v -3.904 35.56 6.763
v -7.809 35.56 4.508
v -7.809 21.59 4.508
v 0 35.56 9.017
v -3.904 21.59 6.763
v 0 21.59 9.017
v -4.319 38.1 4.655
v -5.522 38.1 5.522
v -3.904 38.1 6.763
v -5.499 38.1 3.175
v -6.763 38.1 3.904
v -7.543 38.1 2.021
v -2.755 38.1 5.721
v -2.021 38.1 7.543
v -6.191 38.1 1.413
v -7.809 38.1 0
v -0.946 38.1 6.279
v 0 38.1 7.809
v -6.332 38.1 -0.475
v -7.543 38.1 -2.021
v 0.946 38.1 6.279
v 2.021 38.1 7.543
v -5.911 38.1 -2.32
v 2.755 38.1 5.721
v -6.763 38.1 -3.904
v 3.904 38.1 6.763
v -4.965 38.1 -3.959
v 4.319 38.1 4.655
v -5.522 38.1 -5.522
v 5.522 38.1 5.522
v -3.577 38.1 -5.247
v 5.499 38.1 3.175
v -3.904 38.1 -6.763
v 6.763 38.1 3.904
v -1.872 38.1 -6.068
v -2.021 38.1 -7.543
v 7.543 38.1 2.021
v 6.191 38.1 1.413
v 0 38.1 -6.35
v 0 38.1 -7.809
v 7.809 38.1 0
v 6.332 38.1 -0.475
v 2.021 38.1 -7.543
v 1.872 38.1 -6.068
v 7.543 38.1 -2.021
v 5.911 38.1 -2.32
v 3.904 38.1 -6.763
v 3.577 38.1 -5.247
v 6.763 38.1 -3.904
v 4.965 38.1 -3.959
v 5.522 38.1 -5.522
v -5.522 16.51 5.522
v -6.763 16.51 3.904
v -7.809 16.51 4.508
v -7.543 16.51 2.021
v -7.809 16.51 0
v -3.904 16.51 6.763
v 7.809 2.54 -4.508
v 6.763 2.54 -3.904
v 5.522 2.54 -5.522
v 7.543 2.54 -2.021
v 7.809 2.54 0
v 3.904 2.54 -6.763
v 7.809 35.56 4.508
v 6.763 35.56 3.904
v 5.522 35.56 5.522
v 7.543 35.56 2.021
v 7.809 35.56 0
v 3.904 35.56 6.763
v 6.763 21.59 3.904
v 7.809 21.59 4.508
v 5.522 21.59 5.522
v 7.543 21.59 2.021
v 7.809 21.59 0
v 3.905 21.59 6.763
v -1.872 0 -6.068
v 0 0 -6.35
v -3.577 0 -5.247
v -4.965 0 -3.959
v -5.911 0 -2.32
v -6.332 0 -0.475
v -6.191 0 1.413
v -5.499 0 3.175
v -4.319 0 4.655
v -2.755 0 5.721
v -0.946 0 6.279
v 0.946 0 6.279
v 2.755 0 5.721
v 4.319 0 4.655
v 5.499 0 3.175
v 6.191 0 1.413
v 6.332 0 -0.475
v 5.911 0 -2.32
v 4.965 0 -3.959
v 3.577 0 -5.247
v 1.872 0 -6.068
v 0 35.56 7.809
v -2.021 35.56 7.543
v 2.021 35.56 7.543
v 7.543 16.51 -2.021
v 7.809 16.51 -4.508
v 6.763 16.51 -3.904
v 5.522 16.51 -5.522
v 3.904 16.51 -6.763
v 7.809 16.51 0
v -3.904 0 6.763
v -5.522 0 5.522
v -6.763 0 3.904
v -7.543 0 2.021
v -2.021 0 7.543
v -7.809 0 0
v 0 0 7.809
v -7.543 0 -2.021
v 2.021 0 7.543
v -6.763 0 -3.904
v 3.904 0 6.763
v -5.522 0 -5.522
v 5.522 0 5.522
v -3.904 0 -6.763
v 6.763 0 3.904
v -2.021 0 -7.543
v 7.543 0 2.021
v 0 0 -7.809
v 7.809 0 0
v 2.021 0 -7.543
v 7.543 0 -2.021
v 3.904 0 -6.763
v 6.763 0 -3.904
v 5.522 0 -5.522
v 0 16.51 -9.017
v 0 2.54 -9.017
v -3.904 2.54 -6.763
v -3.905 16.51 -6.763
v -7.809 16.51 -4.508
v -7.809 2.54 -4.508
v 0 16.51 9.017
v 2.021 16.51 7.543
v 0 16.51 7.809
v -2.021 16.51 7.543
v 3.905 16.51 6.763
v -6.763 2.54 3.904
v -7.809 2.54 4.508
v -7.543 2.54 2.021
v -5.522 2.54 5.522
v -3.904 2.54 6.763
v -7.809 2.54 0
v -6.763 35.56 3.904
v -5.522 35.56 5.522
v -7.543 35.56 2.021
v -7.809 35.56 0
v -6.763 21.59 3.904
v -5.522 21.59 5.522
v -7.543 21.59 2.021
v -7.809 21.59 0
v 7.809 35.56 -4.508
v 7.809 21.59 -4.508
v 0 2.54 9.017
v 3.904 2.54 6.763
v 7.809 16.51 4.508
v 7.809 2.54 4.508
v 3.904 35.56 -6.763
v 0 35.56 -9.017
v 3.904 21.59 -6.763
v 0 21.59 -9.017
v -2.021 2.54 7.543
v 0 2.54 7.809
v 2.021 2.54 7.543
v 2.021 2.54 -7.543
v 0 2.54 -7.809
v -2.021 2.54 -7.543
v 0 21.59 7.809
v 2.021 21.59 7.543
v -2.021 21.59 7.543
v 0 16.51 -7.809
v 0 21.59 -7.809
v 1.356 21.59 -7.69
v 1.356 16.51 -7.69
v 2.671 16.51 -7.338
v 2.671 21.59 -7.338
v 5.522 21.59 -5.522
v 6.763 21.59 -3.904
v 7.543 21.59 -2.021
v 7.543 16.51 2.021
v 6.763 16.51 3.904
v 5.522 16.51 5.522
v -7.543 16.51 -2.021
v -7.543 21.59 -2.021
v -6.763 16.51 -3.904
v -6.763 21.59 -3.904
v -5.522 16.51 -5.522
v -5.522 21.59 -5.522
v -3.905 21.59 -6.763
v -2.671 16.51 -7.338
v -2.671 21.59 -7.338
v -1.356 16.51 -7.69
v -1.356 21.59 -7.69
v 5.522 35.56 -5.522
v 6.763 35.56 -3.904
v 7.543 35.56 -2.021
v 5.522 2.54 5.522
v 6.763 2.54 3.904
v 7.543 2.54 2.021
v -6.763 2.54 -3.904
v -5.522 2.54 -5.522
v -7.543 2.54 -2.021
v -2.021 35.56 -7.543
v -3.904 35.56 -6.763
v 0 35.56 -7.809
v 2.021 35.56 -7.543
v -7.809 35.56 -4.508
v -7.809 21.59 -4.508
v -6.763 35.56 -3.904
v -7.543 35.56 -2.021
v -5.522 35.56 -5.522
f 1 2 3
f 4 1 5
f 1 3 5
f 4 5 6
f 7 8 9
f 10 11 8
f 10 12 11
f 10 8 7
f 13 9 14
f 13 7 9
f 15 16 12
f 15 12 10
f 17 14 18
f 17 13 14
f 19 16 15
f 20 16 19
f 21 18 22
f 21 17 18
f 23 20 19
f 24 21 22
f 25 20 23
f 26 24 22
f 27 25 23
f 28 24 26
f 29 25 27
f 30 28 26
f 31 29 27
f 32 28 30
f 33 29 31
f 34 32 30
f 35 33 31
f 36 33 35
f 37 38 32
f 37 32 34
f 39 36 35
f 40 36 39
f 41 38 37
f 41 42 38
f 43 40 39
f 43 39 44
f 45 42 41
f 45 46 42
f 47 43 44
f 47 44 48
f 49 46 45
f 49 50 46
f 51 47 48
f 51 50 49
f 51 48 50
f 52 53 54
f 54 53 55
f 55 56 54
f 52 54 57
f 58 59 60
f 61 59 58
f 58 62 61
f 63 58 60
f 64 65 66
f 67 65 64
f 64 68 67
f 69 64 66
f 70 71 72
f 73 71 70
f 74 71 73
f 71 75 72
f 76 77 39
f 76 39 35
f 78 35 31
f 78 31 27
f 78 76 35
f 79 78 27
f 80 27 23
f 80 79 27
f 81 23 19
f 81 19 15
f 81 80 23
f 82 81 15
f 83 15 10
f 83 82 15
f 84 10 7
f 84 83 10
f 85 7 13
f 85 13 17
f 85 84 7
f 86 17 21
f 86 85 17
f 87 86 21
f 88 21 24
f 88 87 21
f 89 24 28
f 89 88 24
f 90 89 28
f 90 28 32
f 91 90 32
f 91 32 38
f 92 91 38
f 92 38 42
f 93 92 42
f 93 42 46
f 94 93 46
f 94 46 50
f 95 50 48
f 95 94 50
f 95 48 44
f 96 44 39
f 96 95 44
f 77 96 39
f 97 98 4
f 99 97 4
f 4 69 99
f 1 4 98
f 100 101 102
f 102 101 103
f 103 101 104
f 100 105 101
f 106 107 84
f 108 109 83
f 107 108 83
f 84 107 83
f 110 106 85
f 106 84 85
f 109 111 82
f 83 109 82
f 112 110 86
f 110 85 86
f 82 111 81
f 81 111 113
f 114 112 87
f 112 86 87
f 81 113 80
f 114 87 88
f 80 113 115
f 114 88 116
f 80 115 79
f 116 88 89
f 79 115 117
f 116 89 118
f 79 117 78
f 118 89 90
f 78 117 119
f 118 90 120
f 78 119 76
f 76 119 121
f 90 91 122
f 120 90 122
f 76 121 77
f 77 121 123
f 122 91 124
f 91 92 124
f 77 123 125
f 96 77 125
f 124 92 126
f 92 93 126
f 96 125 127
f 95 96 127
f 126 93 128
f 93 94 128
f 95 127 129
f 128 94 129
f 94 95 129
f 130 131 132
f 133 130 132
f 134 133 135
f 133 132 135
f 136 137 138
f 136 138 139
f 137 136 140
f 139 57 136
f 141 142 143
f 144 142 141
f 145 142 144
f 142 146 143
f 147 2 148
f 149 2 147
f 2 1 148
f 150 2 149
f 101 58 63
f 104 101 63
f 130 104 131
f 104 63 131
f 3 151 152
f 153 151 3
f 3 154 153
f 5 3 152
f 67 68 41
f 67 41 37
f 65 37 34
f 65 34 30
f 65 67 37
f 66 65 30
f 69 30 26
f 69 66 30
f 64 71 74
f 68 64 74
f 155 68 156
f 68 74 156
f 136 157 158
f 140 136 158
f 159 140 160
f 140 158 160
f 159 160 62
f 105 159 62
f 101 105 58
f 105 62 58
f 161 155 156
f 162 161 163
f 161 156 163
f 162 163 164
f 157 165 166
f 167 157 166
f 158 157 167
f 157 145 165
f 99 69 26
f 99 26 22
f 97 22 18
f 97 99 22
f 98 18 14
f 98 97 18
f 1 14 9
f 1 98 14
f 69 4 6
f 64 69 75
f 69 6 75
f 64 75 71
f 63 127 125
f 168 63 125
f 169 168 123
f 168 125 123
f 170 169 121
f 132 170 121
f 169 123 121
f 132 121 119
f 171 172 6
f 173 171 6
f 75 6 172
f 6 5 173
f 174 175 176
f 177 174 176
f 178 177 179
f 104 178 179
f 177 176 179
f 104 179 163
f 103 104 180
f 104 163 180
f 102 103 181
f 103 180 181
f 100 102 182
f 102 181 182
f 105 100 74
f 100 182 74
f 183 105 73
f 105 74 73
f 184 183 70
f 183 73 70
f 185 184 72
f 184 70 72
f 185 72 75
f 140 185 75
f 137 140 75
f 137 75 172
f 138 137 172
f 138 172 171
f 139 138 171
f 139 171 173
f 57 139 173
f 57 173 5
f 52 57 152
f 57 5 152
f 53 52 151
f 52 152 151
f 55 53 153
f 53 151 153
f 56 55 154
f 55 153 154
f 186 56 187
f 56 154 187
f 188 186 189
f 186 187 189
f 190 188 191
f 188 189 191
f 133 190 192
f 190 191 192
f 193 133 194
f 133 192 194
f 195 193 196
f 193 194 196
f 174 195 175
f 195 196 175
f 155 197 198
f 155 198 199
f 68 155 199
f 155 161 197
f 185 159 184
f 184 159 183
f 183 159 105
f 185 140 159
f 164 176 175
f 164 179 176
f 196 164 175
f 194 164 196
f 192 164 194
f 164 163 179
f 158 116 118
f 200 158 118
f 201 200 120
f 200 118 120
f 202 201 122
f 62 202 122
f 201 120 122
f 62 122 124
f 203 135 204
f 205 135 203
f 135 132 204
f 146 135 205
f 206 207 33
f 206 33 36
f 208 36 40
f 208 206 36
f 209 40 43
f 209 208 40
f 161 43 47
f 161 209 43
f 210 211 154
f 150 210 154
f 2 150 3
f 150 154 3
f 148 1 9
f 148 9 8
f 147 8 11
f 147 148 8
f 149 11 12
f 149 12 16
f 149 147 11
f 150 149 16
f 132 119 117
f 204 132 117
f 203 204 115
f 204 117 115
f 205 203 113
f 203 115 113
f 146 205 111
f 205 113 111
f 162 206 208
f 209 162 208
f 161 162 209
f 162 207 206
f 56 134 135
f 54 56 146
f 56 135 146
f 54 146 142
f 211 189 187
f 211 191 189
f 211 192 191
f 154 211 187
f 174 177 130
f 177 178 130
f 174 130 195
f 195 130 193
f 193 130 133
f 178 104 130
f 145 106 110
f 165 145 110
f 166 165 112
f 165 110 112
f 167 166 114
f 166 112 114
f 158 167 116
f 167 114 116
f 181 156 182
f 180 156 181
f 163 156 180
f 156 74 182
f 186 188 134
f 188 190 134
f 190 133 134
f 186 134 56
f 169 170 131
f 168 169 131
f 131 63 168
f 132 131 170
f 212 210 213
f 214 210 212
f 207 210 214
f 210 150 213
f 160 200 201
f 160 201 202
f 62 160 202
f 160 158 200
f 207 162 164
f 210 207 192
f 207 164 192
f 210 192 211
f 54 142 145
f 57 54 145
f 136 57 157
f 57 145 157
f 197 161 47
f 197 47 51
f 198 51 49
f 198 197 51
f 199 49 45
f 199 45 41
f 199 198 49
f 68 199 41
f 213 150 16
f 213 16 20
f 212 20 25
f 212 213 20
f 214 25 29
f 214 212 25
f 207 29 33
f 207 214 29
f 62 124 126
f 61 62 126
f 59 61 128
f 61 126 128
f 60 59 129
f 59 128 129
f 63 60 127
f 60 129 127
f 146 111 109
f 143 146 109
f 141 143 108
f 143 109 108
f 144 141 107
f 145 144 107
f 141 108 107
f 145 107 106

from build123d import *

# Parameters (mm, degrees)
SKETCH1_R               = 6.35
BOSS_EXTRUDE1_DEPTH     = 38.1
CUT_EXTRUDE1_DEPTH      = 2.54
CUT_EXTRUDE2_START      = -2.54
CUT_EXTRUDE2_DEPTH      = 2.54
CUT_EXTRUDE3_DEPTH      = 2.54
CUT_EXTRUDE3_DEPTH_BACK = 2.54
SKETCH5_R               = 11.357347969
SKETCH5_R_2             = 7.808951066


with BuildPart() as part:
    # Sketch1 → Boss-Extrude1 (new body)
    with BuildSketch(Plane(origin=(0, 0, 0), x_dir=(1, 0, 0), z_dir=(0, 1, 0))):
        Polygon((0, 9.017), (-7.808951066, 4.5085), (-7.808951066, -4.5085), (0, -9.017), (7.808951066, -4.5085), (7.808951066, 4.5085), align=None)
        with Locations(Location((0, 0, 0), (0, 0, 90))):
            Circle(SKETCH1_R, mode=Mode.SUBTRACT)
    extrude(amount=BOSS_EXTRUDE1_DEPTH)

    # Sketch3 → Cut-Extrude1 (cut)
    with BuildSketch(Plane.XZ):
        with BuildLine():
            Line((7.808951066, -4.5085), (7.808951066, 0))
            ThreePointArc((7.808951066, 0), (6.762749987, -3.904475555), (3.904475488, -6.762750026))
            Line((3.904475488, -6.762750026), (7.808951066, -4.5085))
        make_face()
        with BuildLine():
            ThreePointArc((3.904475554, 6.762749988), (6.762750006, 3.904475522), (7.808951066, 0))
            Line((7.808951066, 0), (7.808951066, 4.5085))
            Line((7.808951066, 4.5085), (3.904475554, 6.762749988))
        make_face()
        with BuildLine():
            ThreePointArc((-3.904475468, 6.762750038), (5e-08, 7.808951066), (3.904475554, 6.762749988))
            Line((3.904475554, 6.762749988), (0, 9.017))
            Line((0, 9.017), (-3.904475468, 6.762750038))
        make_face()
        with BuildLine():
            Line((0, -9.017), (3.904475488, -6.762750026))
            ThreePointArc((3.904475488, -6.762750026), (-3.8e-08, -7.808951066), (-3.904475554, -6.762749988))
            Line((-3.904475554, -6.762749988), (0, -9.017))
        make_face()
        with BuildLine():
            ThreePointArc((-7.808951066, 1.5e-08), (-6.762749977, 3.904475572), (-3.904475468, 6.762750038))
            Line((-3.904475468, 6.762750038), (-7.808951066, 4.5085))
            Line((-7.808951066, 4.5085), (-7.808951066, 1.5e-08))
        make_face()
        with BuildLine():
            Line((-7.808951066, -4.5085), (-3.904475554, -6.762749988))
            ThreePointArc((-3.904475554, -6.762749988), (-6.76275001, -3.904475516), (-7.808951066, 1.5e-08))
            Line((-7.808951066, 1.5e-08), (-7.808951066, -4.5085))
        make_face()
    extrude(amount=-CUT_EXTRUDE1_DEPTH, mode=Mode.SUBTRACT)

    # Sketch4 → Cut-Extrude2 (cut)
    with BuildSketch(Plane(origin=(0, 38.1, 0), x_dir=(1, 0, 0), z_dir=(0, 1, 0)).offset(CUT_EXTRUDE2_START)):
        with BuildLine():
            Line((-7.808951066, -4.5085), (-3.904475554, -6.762749988))
            ThreePointArc((-3.904475554, -6.762749988), (-6.762750002, -3.904475529), (-7.808951066, -1.5e-08))
            Line((-7.808951066, -1.5e-08), (-7.808951066, -4.5085))
        make_face()
        with BuildLine():
            Line((0, -9.017), (3.904475554, -6.762749988))
            ThreePointArc((3.904475554, -6.762749988), (0, -7.808951066), (-3.904475554, -6.762749988))
            Line((-3.904475554, -6.762749988), (0, -9.017))
        make_face()
        with BuildLine():
            ThreePointArc((-7.808951066, -1.5e-08), (-6.76275001, 3.904475516), (-3.904475554, 6.762749988))
            Line((-3.904475554, 6.762749988), (-7.808951066, 4.5085))
            Line((-7.808951066, 4.5085), (-7.808951066, -1.5e-08))
        make_face()
        with BuildLine():
            ThreePointArc((-3.904475554, 6.762749988), (-5e-08, 7.808951066), (3.904475468, 6.762750038))
            Line((3.904475468, 6.762750038), (0, 9.017))
            Line((0, 9.017), (-3.904475554, 6.762749988))
        make_face()
        with BuildLine():
            ThreePointArc((3.904475468, 6.762750038), (6.762749981, 3.904475566), (7.808951066, 0))
            Line((7.808951066, 0), (7.808951066, 4.5085))
            Line((7.808951066, 4.5085), (3.904475468, 6.762750038))
        make_face()
        with BuildLine():
            Line((7.808951066, -4.5085), (7.808951066, 0))
            ThreePointArc((7.808951066, 0), (6.762750006, -3.904475522), (3.904475554, -6.762749988))
            Line((3.904475554, -6.762749988), (7.808951066, -4.5085))
        make_face()
    extrude(amount=CUT_EXTRUDE2_DEPTH, mode=Mode.SUBTRACT)

    # Sketch5 → Cut-Extrude3 (cut, two sides: drawn at the far end of the back side and taken through both)
    with BuildSketch(Plane(origin=(0, 19.05, 0), x_dir=(-1, 0, 0), z_dir=(0, -1, 0)).offset(-CUT_EXTRUDE3_DEPTH_BACK)):
        Circle(SKETCH5_R)
        with Locations(Location((0, 0, 0), (0, 0, 90))):
            Circle(SKETCH5_R_2, mode=Mode.SUBTRACT)
    extrude(amount=CUT_EXTRUDE3_DEPTH + CUT_EXTRUDE3_DEPTH_BACK, mode=Mode.SUBTRACT)


solid = part.part
